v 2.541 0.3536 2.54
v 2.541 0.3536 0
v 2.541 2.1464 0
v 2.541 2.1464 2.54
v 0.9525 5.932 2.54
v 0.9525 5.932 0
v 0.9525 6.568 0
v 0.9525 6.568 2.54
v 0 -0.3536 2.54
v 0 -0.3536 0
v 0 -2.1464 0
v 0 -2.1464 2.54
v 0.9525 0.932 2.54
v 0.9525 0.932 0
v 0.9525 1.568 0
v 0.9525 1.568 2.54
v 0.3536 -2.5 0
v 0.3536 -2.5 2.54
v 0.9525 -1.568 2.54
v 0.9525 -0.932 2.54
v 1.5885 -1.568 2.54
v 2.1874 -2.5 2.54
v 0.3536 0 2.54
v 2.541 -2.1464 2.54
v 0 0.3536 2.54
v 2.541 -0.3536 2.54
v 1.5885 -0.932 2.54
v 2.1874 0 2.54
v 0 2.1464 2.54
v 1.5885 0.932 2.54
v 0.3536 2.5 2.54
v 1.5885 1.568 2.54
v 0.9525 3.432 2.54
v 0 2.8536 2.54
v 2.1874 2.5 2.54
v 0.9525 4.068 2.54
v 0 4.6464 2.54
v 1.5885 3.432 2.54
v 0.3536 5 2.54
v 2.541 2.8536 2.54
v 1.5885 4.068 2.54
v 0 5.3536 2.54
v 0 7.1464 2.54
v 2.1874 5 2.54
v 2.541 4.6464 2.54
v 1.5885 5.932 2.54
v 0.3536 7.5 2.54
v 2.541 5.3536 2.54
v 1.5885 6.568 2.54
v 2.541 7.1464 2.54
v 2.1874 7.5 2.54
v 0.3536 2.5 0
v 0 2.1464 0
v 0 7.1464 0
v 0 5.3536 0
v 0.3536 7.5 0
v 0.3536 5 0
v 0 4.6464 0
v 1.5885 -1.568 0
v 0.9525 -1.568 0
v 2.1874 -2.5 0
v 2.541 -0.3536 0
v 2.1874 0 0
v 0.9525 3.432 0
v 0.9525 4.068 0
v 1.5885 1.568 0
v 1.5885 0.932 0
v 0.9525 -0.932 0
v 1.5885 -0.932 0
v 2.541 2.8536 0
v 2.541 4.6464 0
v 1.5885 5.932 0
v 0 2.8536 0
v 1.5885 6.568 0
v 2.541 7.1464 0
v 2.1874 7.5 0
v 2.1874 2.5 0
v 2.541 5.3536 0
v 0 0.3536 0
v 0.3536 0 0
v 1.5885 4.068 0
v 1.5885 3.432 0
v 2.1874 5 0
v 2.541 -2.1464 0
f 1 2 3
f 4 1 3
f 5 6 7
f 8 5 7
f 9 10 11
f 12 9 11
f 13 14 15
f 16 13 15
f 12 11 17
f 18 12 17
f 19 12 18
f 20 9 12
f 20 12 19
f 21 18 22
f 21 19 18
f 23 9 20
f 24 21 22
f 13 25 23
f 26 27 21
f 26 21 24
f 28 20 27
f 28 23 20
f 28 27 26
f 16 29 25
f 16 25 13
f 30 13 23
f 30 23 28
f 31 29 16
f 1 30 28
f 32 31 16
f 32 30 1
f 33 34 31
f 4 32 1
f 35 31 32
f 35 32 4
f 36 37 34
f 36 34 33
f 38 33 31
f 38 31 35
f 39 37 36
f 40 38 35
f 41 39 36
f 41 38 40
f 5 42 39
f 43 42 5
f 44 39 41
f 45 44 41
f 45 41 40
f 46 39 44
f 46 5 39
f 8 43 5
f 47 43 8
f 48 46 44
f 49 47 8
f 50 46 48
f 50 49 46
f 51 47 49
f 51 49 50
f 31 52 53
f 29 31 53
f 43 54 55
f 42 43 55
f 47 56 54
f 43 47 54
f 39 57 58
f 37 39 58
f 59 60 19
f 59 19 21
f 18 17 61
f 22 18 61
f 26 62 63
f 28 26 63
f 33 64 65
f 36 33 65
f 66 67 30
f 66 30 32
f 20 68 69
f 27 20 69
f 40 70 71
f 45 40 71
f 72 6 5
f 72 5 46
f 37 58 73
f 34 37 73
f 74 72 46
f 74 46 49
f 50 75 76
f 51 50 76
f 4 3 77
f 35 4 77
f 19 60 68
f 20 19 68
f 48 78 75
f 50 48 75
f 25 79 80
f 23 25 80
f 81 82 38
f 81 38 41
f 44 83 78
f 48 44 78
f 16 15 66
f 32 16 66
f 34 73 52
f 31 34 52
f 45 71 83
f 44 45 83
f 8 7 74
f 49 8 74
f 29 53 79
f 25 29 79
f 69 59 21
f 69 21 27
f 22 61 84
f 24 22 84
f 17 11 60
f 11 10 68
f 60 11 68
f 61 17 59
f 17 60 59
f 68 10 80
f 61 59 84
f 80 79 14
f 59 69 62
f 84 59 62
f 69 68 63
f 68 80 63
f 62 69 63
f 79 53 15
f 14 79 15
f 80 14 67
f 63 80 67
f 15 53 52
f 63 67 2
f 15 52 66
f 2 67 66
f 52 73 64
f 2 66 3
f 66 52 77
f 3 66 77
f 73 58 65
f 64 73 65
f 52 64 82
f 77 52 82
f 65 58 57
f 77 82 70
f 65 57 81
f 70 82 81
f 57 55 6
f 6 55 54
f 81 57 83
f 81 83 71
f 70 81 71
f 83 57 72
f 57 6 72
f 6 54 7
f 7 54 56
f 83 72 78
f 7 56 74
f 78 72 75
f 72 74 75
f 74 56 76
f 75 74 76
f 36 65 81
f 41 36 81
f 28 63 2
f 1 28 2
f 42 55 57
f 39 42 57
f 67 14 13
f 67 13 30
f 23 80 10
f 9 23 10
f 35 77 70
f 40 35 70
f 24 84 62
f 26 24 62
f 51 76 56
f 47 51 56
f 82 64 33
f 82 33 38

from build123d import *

# Parameters (mm, degrees)
PIN_DRAWING_W       = 0.636
PIN_DRAWING_H       = 0.636
BOSS_EXTRUDE1_DEPTH = 2.54


with BuildPart() as part:
    # pin_drawing → Boss-Extrude1 (new body)
    with BuildSketch(Plane.XY):
        Polygon((0, 2.146446609), (0, 0.353553391), (0.353553391, 0), (0, -0.353553391), (0, -2.146446609), (0.353553391, -2.5), (2.187446609, -2.5), (2.541, -2.146446609), (2.541, -0.353553391), (2.187446609, 0), (2.541, 0.353553391), (2.541, 2.146446609), (2.187446609, 2.5), (2.541, 2.853553391), (2.541, 4.646446609), (2.187446609, 5), (2.541, 5.353553391), (2.541, 7.146446609), (2.187446609, 7.5), (0.353553391, 7.5), (0, 7.146446609), (0, 5.353553391), (0.353553391, 5), (0, 4.646446609), (0, 2.853553391), (0.353553391, 2.5), align=None)
        with Locations((1.2705, -1.25)):
            Rectangle(PIN_DRAWING_W, PIN_DRAWING_H, mode=Mode.SUBTRACT)
        with Locations((1.2705, 1.25)):
            Rectangle(PIN_DRAWING_W, PIN_DRAWING_H, mode=Mode.SUBTRACT)
        with Locations((1.2705, 3.75)):
            Rectangle(PIN_DRAWING_W, PIN_DRAWING_H, mode=Mode.SUBTRACT)
        with Locations((1.2705, 6.25)):
            Rectangle(PIN_DRAWING_W, PIN_DRAWING_H, mode=Mode.SUBTRACT)
    extrude(amount=BOSS_EXTRUDE1_DEPTH)


solid = part.part
